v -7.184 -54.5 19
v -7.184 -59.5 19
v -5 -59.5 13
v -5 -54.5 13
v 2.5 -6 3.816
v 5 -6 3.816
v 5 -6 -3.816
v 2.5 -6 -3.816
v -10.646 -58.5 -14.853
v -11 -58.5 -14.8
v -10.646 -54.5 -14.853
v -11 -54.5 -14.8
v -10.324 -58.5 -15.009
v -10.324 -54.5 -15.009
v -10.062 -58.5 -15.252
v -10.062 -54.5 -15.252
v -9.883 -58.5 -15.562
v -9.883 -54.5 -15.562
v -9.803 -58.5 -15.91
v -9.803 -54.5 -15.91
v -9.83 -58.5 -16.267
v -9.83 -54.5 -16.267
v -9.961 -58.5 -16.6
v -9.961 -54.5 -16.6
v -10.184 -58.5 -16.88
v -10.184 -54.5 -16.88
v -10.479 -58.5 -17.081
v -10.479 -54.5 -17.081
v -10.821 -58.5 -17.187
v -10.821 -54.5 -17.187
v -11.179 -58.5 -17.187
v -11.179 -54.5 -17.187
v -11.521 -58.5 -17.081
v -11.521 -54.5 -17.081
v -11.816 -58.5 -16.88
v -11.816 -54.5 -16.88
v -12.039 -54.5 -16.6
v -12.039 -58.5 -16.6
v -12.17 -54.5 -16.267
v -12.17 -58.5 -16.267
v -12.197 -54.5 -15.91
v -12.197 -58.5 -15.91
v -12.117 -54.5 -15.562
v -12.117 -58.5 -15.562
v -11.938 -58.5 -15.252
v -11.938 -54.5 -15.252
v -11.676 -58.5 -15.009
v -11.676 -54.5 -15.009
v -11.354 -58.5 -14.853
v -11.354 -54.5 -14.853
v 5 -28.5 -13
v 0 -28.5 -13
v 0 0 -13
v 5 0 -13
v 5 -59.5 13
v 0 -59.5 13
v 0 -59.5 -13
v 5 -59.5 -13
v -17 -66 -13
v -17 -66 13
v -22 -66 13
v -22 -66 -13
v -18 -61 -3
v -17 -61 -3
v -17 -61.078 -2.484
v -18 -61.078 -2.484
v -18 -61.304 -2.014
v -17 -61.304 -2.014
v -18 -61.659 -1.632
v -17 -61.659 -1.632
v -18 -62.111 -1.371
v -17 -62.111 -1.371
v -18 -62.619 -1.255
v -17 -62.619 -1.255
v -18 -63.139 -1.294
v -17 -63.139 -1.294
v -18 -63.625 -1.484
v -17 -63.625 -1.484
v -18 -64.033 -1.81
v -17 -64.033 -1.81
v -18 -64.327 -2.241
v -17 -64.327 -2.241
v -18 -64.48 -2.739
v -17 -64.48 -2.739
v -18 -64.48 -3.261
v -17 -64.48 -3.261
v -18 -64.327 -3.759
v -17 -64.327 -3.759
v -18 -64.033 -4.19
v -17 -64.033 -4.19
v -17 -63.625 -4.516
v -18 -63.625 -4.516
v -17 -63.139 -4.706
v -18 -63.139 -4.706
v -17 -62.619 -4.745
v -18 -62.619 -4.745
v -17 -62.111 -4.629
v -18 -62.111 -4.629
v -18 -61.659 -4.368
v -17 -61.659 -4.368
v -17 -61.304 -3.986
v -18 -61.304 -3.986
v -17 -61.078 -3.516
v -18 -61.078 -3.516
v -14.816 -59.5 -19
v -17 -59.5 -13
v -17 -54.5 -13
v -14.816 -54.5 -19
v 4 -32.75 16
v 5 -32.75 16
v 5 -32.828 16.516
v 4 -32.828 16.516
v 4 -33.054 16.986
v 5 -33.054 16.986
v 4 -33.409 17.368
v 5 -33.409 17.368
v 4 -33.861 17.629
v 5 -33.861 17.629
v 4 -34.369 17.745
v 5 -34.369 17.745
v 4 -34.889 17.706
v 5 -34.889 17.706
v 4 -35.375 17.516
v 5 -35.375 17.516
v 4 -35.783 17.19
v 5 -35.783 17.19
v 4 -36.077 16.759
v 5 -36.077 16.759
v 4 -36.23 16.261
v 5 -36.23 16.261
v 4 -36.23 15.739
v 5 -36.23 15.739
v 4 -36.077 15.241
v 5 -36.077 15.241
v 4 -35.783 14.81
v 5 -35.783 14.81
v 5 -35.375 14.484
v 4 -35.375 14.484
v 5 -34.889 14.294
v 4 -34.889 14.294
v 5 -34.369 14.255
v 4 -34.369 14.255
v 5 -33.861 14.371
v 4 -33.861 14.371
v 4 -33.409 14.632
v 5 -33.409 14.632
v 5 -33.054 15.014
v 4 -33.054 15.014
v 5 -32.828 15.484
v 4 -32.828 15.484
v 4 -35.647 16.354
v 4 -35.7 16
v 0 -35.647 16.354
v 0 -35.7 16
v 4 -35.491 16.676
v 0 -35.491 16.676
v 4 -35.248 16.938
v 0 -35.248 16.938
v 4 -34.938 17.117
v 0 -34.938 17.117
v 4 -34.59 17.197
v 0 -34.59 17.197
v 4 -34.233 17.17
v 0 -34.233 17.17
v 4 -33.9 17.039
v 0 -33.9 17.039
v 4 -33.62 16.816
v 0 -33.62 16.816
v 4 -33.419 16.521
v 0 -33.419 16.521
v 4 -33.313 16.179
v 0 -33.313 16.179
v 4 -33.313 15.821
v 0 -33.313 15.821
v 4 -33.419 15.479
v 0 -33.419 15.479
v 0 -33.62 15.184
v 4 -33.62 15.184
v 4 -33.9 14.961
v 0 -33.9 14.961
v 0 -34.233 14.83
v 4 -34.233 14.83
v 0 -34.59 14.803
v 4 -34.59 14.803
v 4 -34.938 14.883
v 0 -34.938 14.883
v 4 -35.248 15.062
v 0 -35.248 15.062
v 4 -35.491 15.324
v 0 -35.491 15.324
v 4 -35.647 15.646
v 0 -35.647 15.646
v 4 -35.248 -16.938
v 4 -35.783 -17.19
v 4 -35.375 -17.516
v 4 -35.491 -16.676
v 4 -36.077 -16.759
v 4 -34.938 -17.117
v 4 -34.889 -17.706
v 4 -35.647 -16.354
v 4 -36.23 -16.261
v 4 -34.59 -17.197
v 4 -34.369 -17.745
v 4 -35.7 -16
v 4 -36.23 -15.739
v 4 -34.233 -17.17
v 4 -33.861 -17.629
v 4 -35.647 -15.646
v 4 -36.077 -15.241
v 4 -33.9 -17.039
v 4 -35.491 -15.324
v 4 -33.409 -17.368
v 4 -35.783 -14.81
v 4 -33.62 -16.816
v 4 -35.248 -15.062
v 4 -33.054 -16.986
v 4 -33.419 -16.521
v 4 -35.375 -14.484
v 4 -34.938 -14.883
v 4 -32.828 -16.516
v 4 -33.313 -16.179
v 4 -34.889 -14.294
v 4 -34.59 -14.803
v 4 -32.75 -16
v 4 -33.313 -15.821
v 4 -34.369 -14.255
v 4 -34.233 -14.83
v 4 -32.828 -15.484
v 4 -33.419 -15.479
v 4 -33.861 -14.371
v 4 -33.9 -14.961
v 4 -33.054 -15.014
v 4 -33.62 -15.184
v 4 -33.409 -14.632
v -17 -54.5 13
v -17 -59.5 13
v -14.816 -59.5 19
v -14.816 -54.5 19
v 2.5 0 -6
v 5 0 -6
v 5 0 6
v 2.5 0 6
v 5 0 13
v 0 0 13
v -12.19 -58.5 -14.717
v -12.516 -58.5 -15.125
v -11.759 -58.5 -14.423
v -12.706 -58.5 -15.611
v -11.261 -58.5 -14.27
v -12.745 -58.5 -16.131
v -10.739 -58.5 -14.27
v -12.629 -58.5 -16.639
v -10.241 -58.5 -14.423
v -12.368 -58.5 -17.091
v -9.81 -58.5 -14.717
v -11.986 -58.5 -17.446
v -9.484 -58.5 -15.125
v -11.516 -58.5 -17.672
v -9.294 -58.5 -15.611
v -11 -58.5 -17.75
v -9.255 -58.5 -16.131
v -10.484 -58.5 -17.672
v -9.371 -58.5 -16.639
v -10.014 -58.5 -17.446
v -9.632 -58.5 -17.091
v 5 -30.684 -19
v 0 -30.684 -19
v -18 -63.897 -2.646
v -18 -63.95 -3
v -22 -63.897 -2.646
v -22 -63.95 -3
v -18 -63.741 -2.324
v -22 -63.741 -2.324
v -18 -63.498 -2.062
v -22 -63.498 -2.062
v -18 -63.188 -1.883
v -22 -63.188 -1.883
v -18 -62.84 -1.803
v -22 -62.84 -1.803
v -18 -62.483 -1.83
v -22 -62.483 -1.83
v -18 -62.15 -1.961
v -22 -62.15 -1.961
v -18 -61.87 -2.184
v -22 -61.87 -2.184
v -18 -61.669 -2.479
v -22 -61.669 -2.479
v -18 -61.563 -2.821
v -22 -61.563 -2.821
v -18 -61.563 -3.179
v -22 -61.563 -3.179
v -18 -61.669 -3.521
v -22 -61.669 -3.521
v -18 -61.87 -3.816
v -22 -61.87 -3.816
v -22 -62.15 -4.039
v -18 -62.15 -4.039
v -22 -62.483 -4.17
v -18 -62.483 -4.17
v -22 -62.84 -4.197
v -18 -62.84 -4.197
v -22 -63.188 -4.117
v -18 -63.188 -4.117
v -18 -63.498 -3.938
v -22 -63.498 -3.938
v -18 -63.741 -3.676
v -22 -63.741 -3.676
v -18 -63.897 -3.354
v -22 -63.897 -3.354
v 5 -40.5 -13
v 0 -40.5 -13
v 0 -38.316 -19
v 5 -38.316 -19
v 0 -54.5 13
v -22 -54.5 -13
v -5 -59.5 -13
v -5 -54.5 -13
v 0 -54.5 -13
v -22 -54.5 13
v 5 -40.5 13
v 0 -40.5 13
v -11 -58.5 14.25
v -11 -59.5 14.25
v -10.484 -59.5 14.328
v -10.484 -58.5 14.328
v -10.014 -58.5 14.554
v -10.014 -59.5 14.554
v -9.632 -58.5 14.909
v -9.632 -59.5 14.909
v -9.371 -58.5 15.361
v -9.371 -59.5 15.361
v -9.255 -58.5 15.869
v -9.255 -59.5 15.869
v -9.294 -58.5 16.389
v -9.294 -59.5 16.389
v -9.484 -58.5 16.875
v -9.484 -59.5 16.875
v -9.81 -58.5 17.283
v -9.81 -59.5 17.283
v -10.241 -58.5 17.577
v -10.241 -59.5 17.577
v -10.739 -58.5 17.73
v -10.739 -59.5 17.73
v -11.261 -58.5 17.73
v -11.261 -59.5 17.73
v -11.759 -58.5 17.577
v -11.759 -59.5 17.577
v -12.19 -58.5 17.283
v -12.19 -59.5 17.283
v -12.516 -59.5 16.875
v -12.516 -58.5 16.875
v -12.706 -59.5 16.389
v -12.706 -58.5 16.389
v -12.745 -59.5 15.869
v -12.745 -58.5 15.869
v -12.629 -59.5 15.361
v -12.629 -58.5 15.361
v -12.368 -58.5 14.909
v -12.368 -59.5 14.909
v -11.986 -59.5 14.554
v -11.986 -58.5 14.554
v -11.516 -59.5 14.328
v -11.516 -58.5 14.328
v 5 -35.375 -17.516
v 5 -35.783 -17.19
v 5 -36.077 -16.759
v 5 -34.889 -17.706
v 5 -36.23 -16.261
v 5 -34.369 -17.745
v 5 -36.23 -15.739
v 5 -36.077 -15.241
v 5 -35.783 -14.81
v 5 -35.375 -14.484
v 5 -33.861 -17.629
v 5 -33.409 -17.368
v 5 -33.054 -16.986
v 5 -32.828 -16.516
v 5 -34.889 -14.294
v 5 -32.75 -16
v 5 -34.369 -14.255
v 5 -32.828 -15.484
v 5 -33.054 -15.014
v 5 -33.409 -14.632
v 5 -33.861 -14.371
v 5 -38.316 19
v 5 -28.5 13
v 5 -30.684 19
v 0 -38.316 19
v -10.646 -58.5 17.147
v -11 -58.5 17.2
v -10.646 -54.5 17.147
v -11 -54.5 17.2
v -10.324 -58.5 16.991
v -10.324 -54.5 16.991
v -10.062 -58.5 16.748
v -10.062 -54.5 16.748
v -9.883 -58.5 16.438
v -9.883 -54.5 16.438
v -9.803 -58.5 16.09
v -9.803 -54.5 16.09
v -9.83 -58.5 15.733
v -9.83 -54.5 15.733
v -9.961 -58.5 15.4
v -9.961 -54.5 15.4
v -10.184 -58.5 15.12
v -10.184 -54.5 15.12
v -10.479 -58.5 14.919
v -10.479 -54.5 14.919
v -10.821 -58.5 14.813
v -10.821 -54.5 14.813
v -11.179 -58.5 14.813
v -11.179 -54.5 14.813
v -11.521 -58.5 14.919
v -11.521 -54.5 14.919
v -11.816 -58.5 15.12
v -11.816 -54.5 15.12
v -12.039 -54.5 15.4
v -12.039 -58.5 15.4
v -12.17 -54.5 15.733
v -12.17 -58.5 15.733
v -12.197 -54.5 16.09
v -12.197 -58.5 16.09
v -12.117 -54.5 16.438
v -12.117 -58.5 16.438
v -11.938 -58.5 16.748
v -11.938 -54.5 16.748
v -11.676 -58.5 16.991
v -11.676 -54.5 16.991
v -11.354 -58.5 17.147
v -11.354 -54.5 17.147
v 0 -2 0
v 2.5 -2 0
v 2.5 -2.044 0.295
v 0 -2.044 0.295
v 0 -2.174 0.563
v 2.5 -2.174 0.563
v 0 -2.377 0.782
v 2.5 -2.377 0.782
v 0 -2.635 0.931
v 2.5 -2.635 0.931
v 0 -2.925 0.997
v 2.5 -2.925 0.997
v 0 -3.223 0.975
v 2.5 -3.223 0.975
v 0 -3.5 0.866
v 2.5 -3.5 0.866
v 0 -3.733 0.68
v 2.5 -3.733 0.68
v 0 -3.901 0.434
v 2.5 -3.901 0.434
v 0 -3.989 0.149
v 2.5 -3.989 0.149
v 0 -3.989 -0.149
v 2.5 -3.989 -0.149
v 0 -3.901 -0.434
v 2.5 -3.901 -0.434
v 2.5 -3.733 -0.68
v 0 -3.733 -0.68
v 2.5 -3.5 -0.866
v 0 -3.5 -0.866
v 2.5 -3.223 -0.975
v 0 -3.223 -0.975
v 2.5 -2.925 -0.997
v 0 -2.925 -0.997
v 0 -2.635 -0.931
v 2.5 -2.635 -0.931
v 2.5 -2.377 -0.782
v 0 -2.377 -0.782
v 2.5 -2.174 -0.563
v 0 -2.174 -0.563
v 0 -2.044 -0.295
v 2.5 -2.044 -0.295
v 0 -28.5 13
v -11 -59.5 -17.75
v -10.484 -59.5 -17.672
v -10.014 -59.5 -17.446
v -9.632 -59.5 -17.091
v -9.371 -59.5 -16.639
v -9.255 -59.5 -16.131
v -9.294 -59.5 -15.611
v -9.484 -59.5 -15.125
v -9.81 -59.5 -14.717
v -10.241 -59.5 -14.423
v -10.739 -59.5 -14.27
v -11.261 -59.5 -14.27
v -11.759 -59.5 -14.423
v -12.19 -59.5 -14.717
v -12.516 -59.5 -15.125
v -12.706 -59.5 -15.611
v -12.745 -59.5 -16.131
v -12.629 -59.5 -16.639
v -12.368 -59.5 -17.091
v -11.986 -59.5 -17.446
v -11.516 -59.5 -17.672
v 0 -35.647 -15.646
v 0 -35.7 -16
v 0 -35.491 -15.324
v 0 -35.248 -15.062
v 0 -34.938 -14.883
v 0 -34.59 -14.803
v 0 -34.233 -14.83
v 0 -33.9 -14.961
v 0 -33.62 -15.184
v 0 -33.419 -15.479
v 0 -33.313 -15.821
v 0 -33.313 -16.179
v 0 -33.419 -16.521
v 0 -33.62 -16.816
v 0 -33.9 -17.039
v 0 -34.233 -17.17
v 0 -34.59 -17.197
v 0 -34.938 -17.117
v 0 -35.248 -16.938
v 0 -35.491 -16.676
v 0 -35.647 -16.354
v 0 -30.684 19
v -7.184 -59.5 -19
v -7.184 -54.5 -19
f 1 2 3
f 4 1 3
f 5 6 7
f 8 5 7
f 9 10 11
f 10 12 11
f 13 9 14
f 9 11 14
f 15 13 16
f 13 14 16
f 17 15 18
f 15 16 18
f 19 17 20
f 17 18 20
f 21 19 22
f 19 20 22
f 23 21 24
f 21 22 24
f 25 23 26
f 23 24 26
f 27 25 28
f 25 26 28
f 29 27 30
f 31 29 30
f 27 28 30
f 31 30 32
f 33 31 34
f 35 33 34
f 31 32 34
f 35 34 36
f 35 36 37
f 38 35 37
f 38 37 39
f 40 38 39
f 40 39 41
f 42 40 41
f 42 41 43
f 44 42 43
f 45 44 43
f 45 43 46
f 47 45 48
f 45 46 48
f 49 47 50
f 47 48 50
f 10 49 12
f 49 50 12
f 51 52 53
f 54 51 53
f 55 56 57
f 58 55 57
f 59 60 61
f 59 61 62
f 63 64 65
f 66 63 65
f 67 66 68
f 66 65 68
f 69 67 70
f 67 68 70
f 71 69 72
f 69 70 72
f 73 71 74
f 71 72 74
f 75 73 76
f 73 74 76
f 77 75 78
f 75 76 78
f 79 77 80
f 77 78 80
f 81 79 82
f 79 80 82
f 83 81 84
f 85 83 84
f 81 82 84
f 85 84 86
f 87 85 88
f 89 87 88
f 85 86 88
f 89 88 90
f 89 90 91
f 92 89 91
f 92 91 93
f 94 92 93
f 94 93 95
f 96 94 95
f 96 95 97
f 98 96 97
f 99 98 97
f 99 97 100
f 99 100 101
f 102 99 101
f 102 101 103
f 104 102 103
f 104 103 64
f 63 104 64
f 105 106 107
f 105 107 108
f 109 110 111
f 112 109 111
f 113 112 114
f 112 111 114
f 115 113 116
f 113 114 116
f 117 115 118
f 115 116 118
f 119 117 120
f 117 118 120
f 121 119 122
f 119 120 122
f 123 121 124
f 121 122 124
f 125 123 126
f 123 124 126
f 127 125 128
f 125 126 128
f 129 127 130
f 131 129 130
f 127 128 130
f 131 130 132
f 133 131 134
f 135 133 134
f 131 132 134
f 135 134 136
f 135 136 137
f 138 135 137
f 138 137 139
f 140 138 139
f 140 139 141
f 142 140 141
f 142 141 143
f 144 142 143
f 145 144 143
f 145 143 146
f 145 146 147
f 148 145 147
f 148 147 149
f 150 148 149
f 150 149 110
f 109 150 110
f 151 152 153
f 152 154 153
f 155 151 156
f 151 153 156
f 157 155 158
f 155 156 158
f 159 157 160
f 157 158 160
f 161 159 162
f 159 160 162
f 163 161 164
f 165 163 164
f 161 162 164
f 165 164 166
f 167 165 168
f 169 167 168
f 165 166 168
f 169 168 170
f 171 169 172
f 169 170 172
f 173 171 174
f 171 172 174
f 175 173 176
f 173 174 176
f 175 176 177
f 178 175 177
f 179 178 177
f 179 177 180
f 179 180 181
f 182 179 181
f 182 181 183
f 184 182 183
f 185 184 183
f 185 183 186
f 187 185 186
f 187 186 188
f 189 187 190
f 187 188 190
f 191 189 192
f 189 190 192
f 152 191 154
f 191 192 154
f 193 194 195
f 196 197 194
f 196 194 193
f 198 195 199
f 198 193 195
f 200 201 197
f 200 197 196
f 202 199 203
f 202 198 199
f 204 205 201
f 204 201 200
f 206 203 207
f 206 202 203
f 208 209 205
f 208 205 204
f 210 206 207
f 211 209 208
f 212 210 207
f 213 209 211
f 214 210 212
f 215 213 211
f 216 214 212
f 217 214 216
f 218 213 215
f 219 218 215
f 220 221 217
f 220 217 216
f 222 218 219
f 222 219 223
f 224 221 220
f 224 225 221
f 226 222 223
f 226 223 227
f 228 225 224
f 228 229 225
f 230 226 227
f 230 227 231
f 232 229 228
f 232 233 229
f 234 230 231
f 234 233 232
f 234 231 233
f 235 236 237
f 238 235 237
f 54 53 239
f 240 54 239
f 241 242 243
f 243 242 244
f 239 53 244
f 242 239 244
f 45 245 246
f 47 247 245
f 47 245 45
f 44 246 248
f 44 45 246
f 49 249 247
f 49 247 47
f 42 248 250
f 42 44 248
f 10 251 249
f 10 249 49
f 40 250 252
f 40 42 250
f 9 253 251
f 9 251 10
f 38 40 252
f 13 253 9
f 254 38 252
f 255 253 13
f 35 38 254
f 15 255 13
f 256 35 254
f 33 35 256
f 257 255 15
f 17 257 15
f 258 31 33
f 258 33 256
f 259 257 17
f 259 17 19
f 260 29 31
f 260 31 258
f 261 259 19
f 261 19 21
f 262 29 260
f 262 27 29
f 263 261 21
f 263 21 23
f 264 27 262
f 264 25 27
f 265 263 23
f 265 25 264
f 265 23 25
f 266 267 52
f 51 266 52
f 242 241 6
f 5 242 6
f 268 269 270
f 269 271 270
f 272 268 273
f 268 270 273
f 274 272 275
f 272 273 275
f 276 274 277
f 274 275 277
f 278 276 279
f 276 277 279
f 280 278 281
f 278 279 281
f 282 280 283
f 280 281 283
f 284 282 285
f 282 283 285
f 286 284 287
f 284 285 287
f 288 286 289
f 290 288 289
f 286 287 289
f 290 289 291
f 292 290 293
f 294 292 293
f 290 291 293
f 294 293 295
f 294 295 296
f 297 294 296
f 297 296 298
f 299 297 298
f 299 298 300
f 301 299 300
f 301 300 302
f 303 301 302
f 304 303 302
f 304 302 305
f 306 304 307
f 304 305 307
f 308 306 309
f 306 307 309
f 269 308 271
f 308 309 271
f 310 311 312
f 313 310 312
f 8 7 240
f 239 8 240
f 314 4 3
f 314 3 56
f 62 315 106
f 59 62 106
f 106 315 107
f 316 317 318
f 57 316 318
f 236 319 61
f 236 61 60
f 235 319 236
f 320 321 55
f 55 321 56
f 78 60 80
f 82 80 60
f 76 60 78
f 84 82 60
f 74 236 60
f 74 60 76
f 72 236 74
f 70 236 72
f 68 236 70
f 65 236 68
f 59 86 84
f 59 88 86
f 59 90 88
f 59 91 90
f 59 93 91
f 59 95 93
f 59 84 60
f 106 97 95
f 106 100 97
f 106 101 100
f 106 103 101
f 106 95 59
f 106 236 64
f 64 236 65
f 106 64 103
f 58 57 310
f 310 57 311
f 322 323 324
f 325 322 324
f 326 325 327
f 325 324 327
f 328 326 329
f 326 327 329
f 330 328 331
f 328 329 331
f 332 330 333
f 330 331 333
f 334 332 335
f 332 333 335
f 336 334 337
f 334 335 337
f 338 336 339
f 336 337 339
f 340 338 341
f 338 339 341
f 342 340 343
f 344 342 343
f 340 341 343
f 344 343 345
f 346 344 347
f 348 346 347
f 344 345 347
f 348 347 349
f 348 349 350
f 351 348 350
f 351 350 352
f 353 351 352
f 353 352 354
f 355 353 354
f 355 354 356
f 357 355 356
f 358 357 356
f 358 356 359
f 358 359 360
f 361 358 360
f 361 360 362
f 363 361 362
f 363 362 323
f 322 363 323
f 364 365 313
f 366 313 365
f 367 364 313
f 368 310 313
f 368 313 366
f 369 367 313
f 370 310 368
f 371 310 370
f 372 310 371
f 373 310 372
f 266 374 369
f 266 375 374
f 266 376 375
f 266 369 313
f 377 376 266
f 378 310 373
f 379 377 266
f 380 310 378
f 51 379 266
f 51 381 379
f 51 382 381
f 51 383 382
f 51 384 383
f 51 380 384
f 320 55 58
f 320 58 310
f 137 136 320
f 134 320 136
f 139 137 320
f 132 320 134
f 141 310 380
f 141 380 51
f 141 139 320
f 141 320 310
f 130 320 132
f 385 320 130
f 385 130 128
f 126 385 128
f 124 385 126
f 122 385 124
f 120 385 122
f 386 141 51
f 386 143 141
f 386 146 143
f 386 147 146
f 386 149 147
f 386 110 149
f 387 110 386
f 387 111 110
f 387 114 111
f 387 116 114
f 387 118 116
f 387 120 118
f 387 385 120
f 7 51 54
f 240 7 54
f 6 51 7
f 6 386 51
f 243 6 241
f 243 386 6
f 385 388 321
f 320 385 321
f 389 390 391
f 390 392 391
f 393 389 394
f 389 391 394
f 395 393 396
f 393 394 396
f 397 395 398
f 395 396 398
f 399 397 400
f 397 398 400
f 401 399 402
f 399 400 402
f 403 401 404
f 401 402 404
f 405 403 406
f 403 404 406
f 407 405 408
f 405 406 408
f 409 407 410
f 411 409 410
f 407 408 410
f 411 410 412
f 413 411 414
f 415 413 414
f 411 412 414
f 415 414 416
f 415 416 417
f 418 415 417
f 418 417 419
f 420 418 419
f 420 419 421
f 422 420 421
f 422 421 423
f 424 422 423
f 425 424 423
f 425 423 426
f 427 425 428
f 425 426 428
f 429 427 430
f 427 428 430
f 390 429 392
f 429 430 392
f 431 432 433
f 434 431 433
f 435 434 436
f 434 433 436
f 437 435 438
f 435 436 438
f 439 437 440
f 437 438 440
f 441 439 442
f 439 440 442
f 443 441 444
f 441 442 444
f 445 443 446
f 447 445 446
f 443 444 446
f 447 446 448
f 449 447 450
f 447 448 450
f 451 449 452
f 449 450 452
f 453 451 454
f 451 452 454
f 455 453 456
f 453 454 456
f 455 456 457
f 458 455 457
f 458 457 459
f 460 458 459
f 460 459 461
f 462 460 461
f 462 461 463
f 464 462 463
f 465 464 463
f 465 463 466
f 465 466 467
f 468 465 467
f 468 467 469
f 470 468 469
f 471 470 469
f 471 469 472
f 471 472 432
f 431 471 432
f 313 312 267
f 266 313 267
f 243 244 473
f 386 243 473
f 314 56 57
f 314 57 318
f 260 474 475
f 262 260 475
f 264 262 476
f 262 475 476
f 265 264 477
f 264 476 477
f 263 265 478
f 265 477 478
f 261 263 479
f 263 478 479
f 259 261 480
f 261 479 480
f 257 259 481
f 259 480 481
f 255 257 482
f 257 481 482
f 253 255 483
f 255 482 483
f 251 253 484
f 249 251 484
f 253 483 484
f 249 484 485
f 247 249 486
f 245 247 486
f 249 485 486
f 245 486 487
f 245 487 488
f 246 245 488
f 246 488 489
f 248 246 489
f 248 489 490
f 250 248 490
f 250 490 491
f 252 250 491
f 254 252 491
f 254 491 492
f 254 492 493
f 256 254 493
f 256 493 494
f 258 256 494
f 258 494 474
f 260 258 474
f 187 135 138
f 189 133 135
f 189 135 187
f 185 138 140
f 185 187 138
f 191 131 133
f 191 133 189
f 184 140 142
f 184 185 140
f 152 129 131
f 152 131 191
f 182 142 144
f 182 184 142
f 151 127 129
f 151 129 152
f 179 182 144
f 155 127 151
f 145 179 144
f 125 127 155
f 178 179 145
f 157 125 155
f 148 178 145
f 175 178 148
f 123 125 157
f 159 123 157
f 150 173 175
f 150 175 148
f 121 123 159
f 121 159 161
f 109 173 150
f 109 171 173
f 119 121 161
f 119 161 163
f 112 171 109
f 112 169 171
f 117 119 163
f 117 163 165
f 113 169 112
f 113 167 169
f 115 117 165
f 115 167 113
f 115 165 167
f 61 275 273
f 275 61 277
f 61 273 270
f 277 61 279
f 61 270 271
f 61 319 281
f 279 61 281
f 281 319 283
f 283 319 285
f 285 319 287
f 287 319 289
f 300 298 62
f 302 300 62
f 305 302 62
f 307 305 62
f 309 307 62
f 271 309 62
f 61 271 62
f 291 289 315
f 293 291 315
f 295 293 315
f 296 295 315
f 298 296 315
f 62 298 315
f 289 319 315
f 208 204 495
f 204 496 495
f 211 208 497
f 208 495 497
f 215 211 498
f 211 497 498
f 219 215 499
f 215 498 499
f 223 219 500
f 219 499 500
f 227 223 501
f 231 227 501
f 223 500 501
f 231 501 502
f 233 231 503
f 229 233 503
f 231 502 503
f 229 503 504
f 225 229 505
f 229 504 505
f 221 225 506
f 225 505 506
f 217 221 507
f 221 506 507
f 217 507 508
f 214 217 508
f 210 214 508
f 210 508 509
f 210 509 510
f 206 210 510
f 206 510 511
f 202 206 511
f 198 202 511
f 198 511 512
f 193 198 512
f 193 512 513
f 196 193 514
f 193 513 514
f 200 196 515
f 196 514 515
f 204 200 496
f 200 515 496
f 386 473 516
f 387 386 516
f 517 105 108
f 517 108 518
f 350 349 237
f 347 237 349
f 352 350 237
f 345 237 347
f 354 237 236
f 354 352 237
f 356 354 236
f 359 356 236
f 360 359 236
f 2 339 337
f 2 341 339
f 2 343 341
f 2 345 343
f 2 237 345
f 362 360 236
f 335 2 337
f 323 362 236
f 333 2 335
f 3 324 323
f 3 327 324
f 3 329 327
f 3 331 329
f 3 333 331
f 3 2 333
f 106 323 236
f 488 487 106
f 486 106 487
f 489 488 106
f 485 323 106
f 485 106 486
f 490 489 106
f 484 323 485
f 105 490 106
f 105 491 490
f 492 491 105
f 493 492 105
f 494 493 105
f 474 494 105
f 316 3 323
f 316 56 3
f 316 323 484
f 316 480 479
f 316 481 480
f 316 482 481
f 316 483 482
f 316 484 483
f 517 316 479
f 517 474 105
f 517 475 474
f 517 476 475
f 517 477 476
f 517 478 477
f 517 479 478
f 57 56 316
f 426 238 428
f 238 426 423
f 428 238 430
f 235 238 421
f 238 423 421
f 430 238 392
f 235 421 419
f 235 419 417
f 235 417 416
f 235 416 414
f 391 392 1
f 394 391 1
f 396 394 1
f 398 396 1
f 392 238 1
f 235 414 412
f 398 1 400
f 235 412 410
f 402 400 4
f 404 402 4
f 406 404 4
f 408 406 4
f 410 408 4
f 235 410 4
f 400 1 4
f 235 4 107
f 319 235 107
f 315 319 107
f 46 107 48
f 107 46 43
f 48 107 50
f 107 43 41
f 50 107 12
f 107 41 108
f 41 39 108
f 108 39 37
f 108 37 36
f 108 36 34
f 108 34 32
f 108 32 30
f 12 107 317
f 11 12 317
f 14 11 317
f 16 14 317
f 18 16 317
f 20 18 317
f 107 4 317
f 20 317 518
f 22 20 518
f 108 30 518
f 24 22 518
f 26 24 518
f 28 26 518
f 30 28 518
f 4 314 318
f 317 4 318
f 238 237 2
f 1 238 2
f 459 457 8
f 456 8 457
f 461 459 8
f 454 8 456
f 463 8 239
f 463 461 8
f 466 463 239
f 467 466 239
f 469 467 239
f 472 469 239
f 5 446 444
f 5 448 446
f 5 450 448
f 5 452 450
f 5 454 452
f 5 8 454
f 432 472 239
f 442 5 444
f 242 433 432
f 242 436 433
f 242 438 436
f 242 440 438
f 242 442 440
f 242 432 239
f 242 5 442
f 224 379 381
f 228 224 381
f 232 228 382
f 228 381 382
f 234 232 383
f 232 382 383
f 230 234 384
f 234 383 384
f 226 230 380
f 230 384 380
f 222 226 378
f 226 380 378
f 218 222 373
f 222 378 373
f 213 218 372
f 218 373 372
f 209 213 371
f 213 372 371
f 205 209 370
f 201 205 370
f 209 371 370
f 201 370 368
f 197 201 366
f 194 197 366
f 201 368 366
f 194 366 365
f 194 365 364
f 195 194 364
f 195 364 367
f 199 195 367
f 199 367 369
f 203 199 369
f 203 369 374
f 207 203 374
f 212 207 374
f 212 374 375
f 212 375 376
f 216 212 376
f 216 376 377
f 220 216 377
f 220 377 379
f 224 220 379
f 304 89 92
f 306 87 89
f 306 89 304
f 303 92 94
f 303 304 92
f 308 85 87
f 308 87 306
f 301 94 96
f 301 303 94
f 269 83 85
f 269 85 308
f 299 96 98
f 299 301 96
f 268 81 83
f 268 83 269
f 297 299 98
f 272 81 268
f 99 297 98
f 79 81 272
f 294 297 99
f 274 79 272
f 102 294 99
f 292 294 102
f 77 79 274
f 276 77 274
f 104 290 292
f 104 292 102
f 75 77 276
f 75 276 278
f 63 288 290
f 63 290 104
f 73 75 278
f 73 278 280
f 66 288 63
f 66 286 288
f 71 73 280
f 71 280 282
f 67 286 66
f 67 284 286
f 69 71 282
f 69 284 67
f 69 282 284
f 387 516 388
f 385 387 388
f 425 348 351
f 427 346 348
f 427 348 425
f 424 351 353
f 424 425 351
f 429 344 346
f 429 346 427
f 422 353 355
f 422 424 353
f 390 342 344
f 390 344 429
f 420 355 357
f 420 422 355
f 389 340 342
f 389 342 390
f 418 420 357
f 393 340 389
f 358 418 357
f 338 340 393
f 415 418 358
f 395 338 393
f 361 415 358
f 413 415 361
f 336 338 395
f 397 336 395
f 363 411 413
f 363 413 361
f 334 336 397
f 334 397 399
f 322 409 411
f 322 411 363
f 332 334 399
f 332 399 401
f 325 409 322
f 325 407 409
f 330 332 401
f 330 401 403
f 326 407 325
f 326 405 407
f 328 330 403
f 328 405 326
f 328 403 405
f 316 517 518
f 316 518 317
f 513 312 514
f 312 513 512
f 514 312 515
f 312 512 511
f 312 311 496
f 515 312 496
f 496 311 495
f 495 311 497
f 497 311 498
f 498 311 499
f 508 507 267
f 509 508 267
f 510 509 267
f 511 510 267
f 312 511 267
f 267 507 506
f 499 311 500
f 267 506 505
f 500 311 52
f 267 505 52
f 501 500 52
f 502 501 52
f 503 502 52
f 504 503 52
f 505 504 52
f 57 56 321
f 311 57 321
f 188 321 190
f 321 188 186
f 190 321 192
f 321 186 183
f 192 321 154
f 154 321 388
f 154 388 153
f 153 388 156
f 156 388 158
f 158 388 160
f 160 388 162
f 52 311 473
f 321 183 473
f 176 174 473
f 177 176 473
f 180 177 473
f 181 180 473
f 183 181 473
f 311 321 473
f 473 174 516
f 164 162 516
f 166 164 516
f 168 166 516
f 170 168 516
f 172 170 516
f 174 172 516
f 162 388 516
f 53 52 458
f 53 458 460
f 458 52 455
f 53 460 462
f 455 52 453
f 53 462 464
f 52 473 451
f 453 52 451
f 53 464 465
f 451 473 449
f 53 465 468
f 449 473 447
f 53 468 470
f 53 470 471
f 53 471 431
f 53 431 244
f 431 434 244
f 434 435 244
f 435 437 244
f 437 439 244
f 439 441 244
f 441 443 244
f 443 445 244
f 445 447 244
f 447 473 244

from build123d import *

# Parameters (mm, degrees)
PAD_DEPTH           = 5
POCKET_DEPTH        = 2.5
HOLE_D              = 2.4
HOLE_DEPTH          = 25
HOLE_CBORE_D        = 3.5
HOLE_CBORE_DEPTH    = 1
SKETCH044_R         = 1
POCKET001_DEPTH     = 5
SKETCH036_W         = 5
SKETCH036_H         = 26
PAD001_DEPTH        = 22
SKETCH037_W         = 26
SKETCH037_H         = 5
PAD002_DEPTH        = 6.5
HOLE001_D           = 2.4
HOLE001_DEPTH       = 25
HOLE001_CBORE_D     = 3.5
HOLE001_CBORE_DEPTH = 1
PAD003_DEPTH        = 5
HOLE002_D           = 2.4
HOLE002_DEPTH       = 25
HOLE002_CBORE_D     = 3.5
HOLE002_CBORE_DEPTH = 1


with BuildPart() as ch001:
    # Sketch → Pad (new body)
    with BuildSketch(Plane.YZ):
        Polygon((-59.5, 13), (-59.5, -13), (-40.5, -13), (-38.316179, -19), (-30.683821, -19), (-28.5, -13), (0, -13), (0, 13), (-28.5, 13), (-30.683821, 19), (-38.316179, 19), (-40.5, 13), align=None)
    extrude(amount=PAD_DEPTH)

    # Sketch042 (on Face14 of Pad) → Pocket (cut)
    with BuildSketch(Plane.YZ.offset(5)):
        Polygon((0, 6), (-6, 3.816179), (-6, -3.816179), (0, -6), align=None)
    extrude(amount=-POCKET_DEPTH, mode=Mode.SUBTRACT)

    # Hole
    with Locations(Plane.YZ.offset(5)):
        with Locations((-34.5, 16), (-34.5, -16)):
            CounterBoreHole(HOLE_D / 2, HOLE_CBORE_D / 2, HOLE_CBORE_DEPTH, depth=HOLE_DEPTH)

    # Sketch044 (on Face22 of Hole) → Pocket001 (cut)
    with BuildSketch(Plane.YZ.offset(2.5)):
        with Locations((-3, 0)):
            Circle(SKETCH044_R)
    extrude(amount=-POCKET001_DEPTH, mode=Mode.SUBTRACT)


with BuildPart() as ch002:
    # Sketch036 → Pad001 (new body)
    with BuildSketch(Plane.YZ):
        with Locations((-57, 0)):
            Rectangle(SKETCH036_W, SKETCH036_H)
    extrude(amount=-PAD001_DEPTH)

    # Sketch037 (on Face1 of Pad001) → Pad002 (join)
    with BuildSketch(Plane(origin=(0, -59.5, 0), x_dir=(0, 0, -1), z_dir=(0, -1, 0))):
        with Locations((0, -19.5)):
            Rectangle(SKETCH037_W, SKETCH037_H)
    extrude(amount=PAD002_DEPTH)

    # Hole001
    with Locations(Plane.YZ.offset(-17)):
        with Locations((-62.75, -3)):
            CounterBoreHole(HOLE001_D / 2, HOLE001_CBORE_D / 2, HOLE001_CBORE_DEPTH, depth=HOLE001_DEPTH)

    # Sketch040 (on Face1 of Pad001) → Pad003 (join)
    with BuildSketch(Plane(origin=(0, -59.5, 0), x_dir=(0, 0, -1), z_dir=(0, -1, 0))):
        Polygon((13, -17), (19, -14.816179), (19, -7.183821), (13, -5), align=None)
        Polygon((-13, -17), (-19, -14.816179), (-19, -7.183821), (-13, -5), align=None)
    extrude(amount=-PAD003_DEPTH)

    # Hole002
    with Locations(Plane(origin=(0, -59.5, 0), x_dir=(0, 0, -1), z_dir=(0, -1, 0))):
        with Locations((16, -11), (-16, -11)):
            CounterBoreHole(HOLE002_D / 2, HOLE002_CBORE_D / 2, HOLE002_CBORE_DEPTH, depth=HOLE002_DEPTH)


solid = Compound([ch001.part, ch002.part])
